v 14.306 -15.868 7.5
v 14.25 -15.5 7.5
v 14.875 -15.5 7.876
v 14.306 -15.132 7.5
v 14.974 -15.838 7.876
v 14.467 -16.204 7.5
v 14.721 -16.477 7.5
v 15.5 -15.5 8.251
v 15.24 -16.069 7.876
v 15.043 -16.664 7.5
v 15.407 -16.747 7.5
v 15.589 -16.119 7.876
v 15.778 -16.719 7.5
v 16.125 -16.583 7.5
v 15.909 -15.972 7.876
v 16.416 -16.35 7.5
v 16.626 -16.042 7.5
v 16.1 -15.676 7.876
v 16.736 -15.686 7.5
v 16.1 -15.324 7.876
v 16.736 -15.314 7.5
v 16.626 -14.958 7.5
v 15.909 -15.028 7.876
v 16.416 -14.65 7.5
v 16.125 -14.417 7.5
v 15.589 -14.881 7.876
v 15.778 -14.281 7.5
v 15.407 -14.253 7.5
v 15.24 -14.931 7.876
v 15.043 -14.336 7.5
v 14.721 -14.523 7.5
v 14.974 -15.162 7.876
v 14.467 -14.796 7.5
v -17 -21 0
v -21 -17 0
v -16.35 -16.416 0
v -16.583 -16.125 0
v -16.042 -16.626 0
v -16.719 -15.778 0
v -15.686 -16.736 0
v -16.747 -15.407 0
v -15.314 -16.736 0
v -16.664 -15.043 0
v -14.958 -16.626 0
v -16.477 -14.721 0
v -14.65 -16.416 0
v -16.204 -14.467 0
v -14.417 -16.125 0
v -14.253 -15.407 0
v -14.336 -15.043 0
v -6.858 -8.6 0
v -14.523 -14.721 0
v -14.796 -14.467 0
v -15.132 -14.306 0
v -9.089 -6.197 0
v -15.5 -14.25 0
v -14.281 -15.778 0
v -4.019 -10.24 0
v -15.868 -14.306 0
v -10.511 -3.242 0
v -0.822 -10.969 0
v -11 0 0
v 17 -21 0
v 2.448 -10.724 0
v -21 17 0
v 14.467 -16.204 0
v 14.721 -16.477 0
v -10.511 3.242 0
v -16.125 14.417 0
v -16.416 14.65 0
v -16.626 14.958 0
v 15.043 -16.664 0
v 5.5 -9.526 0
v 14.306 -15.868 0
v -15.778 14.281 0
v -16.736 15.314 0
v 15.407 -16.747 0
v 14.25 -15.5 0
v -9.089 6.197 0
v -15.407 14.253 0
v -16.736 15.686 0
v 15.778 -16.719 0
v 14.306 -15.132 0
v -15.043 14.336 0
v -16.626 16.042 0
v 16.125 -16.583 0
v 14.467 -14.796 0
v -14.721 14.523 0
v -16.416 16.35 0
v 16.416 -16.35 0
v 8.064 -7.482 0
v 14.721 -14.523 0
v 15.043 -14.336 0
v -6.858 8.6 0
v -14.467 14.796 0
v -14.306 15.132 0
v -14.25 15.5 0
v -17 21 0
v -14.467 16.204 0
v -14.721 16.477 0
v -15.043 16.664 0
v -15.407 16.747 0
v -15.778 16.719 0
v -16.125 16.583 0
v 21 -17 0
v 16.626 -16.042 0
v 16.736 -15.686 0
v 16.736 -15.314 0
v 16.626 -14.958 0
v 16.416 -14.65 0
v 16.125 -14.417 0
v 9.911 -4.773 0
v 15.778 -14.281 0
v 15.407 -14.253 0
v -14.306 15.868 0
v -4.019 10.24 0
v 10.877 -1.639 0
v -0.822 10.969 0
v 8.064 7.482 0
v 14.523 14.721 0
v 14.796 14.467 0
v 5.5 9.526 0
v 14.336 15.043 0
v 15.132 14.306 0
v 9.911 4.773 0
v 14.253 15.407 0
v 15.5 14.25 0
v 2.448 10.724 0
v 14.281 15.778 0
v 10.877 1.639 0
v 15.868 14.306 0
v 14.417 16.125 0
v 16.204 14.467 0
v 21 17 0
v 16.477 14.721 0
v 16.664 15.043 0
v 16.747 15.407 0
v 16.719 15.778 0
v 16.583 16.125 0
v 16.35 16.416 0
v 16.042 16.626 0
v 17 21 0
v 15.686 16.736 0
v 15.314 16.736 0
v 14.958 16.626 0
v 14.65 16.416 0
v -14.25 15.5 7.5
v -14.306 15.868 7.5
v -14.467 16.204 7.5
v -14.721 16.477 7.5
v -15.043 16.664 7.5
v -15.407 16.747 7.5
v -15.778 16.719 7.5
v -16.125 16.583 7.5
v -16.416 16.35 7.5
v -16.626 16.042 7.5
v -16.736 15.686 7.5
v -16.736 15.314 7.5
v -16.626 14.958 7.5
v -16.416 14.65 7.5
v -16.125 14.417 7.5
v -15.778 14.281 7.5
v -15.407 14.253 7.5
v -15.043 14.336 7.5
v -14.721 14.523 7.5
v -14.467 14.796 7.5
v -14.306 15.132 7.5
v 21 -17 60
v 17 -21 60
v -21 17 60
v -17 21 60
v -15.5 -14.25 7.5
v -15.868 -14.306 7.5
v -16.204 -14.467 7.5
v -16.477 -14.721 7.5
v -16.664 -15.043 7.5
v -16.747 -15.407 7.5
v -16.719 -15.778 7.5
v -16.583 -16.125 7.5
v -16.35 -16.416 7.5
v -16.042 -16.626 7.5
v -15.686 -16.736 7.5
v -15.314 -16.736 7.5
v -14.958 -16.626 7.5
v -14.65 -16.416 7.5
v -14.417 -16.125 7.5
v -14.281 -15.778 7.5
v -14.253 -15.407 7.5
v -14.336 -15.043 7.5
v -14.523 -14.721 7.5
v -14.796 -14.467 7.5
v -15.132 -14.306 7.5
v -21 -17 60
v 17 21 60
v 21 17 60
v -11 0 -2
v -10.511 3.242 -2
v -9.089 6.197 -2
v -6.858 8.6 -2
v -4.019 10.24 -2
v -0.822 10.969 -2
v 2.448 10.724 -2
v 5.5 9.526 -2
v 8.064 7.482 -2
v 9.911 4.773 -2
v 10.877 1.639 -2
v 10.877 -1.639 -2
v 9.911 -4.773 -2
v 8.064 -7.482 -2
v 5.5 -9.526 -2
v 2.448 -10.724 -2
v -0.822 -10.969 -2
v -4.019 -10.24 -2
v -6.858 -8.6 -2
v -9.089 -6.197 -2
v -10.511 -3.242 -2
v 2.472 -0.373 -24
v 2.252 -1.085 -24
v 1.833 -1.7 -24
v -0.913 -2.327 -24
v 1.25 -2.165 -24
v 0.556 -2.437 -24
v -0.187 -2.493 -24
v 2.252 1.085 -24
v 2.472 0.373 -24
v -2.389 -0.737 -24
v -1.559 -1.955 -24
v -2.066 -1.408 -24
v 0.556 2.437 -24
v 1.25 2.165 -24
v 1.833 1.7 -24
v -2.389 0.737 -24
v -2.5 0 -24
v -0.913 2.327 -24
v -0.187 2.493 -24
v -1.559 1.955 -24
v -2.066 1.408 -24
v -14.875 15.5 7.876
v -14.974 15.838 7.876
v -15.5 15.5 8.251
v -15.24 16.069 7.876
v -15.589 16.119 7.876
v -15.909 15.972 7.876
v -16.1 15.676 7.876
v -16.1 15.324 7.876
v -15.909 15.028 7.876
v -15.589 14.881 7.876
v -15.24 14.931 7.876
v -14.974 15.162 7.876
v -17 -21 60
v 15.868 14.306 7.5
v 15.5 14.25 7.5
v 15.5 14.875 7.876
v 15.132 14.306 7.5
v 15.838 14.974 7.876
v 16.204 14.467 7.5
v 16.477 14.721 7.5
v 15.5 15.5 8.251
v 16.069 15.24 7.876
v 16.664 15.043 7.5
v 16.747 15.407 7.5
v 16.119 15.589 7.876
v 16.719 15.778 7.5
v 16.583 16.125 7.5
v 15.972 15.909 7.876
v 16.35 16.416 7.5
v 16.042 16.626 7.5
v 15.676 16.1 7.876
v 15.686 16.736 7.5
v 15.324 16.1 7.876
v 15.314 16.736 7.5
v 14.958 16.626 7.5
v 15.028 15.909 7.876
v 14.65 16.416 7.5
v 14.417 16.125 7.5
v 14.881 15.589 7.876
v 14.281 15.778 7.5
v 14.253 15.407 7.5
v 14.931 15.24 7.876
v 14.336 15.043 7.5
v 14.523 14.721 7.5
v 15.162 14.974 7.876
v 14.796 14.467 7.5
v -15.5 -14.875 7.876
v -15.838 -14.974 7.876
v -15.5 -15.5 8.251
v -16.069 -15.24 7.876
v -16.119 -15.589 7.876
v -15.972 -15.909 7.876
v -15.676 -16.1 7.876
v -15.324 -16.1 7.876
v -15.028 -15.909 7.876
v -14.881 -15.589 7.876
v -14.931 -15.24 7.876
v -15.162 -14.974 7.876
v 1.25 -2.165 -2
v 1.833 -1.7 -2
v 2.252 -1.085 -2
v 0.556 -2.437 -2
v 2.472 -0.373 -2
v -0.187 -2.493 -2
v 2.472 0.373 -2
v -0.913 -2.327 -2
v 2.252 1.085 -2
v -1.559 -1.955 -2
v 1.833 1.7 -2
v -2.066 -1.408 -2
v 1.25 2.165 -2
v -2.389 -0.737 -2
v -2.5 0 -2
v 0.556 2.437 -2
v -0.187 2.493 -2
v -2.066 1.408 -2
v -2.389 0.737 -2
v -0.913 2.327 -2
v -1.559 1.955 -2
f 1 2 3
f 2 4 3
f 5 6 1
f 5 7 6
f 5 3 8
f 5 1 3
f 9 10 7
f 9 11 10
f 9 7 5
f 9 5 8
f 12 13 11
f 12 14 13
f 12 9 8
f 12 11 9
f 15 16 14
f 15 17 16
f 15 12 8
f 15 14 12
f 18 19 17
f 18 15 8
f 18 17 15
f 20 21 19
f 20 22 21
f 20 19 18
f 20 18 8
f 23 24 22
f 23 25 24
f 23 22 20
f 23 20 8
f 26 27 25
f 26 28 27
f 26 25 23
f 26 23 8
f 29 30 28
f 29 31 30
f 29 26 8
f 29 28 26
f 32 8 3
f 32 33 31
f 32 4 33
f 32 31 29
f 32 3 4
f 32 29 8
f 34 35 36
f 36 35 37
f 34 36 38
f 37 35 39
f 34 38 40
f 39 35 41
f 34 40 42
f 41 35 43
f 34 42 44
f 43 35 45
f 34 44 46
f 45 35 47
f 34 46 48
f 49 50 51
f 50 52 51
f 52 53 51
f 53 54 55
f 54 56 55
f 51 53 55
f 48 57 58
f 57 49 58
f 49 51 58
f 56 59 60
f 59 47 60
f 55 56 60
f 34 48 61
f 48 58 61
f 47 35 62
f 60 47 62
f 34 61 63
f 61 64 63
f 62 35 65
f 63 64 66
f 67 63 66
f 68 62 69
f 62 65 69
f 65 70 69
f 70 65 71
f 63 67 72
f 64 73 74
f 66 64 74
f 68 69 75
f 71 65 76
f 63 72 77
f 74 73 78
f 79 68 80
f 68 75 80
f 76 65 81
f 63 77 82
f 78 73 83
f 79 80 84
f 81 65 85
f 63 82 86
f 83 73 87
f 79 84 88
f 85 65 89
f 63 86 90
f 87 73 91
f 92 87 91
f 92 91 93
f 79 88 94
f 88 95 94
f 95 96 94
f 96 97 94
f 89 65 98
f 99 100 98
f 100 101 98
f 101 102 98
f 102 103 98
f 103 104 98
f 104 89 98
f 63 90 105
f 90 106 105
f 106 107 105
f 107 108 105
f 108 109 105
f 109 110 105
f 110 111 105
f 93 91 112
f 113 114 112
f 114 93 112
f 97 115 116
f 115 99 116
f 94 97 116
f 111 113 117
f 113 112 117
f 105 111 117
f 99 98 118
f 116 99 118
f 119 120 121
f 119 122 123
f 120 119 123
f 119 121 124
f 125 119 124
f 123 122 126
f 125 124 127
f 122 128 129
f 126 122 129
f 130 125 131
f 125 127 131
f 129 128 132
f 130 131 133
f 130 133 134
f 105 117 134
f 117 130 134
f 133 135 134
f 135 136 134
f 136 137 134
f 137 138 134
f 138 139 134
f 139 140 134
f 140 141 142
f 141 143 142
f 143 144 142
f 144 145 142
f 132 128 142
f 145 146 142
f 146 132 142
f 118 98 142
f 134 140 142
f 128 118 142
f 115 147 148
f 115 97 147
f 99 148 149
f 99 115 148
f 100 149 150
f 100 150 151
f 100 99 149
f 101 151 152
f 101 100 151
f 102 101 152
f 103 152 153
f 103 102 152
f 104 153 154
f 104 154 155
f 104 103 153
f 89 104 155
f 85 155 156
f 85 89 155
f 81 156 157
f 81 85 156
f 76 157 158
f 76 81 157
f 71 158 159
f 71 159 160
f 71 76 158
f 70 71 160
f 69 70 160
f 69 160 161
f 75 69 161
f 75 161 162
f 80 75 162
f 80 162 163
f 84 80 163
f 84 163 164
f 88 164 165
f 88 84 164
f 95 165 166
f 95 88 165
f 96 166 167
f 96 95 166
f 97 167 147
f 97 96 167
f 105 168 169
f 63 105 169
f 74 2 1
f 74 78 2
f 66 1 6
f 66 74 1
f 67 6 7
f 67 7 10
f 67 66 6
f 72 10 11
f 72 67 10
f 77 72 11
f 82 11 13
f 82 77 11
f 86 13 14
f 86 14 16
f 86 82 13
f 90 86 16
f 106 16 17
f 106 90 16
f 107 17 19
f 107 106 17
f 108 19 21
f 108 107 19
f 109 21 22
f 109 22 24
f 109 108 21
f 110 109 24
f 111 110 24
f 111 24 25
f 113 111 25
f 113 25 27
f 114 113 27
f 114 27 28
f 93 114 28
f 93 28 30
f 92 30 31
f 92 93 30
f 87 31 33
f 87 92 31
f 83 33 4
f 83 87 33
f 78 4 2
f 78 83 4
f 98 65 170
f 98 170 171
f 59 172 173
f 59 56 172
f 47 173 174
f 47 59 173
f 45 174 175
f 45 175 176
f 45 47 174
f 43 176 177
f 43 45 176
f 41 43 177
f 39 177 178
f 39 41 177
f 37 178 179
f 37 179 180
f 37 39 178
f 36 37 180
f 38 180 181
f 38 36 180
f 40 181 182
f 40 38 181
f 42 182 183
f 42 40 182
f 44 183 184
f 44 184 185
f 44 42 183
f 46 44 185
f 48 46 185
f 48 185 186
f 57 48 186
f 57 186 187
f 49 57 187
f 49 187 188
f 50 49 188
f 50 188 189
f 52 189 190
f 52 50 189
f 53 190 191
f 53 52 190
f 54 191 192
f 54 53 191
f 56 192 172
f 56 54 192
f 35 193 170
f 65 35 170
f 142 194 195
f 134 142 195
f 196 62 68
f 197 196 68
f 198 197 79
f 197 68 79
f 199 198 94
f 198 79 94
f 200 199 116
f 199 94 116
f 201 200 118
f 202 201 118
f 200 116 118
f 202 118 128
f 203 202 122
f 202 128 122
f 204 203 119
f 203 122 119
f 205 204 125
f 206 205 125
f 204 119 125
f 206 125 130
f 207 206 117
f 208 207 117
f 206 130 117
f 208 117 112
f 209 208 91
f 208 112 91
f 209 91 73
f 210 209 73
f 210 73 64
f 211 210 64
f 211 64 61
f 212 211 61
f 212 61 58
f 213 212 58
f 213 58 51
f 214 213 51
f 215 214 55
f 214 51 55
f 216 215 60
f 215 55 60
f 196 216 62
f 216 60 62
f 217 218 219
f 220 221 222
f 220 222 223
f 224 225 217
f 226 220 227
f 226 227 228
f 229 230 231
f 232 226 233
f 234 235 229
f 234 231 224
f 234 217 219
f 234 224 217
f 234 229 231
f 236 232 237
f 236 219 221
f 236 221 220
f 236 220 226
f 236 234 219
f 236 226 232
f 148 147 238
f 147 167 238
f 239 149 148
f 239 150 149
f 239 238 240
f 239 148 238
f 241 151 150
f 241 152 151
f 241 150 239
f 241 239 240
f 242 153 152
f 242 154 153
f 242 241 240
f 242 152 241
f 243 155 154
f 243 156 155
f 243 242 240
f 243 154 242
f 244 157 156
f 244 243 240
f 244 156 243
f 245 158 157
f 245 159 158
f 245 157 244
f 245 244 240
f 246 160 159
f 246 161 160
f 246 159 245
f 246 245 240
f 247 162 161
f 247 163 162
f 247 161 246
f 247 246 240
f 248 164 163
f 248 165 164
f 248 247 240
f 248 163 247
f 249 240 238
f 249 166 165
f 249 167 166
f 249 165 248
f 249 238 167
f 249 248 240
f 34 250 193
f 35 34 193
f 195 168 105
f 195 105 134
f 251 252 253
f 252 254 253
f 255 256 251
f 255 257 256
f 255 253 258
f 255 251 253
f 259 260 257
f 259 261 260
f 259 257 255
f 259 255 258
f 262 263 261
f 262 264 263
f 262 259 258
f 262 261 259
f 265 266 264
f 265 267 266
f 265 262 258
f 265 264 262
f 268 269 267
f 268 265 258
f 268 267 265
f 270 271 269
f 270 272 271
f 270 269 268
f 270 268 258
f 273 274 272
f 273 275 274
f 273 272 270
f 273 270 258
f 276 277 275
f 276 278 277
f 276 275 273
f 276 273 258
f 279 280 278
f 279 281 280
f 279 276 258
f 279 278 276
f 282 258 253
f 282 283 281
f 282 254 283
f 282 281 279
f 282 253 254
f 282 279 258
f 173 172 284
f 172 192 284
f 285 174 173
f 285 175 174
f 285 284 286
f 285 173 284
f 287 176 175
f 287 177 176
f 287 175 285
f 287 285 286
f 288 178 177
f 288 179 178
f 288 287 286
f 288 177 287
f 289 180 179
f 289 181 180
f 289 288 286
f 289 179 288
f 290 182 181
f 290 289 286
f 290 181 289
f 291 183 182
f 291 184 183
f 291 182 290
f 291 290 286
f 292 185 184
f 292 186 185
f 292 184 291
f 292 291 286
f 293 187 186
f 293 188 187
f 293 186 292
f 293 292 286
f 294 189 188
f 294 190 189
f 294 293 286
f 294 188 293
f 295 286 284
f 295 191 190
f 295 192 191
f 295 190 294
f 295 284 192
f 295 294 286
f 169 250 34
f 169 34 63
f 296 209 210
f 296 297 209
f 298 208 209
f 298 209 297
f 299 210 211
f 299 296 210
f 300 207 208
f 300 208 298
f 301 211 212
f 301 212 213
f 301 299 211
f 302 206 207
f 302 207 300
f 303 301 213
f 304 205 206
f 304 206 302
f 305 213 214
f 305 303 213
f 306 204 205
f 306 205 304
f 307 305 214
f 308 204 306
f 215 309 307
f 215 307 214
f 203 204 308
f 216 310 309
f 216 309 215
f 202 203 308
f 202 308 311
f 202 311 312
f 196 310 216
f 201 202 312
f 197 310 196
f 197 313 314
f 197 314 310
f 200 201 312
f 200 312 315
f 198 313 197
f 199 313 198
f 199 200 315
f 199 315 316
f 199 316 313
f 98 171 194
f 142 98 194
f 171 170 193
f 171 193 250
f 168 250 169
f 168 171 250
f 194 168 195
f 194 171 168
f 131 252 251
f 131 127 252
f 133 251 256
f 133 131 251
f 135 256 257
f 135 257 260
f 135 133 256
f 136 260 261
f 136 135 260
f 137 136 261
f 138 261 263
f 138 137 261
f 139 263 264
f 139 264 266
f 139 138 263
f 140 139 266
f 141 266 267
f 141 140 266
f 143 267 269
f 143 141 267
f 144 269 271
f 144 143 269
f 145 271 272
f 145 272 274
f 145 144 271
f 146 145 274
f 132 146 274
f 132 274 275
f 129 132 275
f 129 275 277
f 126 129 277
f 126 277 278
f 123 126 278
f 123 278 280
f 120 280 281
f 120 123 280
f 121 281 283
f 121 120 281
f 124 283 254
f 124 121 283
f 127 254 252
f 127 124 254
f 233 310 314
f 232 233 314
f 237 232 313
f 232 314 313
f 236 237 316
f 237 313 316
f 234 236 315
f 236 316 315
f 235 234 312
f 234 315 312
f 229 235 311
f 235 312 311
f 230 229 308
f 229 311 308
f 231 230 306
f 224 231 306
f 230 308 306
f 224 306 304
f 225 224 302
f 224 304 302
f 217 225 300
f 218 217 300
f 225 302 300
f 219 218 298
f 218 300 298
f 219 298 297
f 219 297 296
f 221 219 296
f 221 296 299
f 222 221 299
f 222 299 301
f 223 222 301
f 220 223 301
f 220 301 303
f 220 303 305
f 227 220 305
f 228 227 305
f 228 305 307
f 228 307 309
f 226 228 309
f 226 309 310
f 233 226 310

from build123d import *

# Parameters (mm, degrees)
SKETCH_1_W               = 42
SKETCH_1_H               = 42
EXTRUDE_1_DEPTH          = 60
SKETCH_8_R               = 2.5
EXTRUDE_2_DEPTH          = 24
CUT_EXTRUDE_1_DEPTH      = 85
PATTERN_CIRCULAR_1_COUNT = 4
SKETCH_12_R              = 11
EXTRUDE_3_DEPTH          = 2


with BuildPart() as part:
    # Эскиз1 → Бобышка-Вытянуть1 (new body)
    with BuildSketch(Plane.XY):
        Rectangle(SKETCH_1_W, SKETCH_1_H)
    extrude(amount=EXTRUDE_1_DEPTH)

    # Эскиз8 → Бобышка-Вытянуть2 (add)
    with BuildSketch(Plane(origin=(0, 0, 0), x_dir=(-1, 0, 0), z_dir=(0, 0, -1))):
        Circle(SKETCH_8_R)
    extrude(amount=EXTRUDE_2_DEPTH)

    # Эскиз9 → Отверстие обработанное метчиком M32 (revolve, cut)
    with BuildSketch(Plane(origin=(-15.5, -15.5, 0), x_dir=(0, 1, 0), z_dir=(1, 0, 0))):
        Polygon((0, 0), (0, 8.251075774), (1.25, 7.5), (1.25, 0), align=None)
    hole_wizard_m32 = revolve(axis=Axis((-15.5, -15.5, -6.35), (0, 0, 1)), mode=Mode.SUBTRACT)

    # Эскиз3 → Вырез-Вытянуть1 (cut, through all)
    with BuildSketch(Plane.XY.offset(60)):
        Polygon((-21, 17), (-17, 21), (-21, 21), align=None)
    cut_extrude_1 = extrude(amount=-CUT_EXTRUDE_1_DEPTH, mode=Mode.SUBTRACT)

    # Круговой массив1: Отверстие обработанное метчиком M32, Вырез-Вытянуть1 ×4 about axis
    pattern_circular_1_axis = Axis((0, 0, 0), (0, 0, 1))
    for i in range(1, PATTERN_CIRCULAR_1_COUNT):
        add(hole_wizard_m32.rotate(pattern_circular_1_axis, i * 360 / PATTERN_CIRCULAR_1_COUNT), mode=Mode.SUBTRACT)
        add(cut_extrude_1.rotate(pattern_circular_1_axis, i * 360 / PATTERN_CIRCULAR_1_COUNT), mode=Mode.SUBTRACT)

    # Эскиз12 → Бобышка-Вытянуть3 (add)
    with BuildSketch(Plane(origin=(0, 0, 0), x_dir=(-1, 0, 0), z_dir=(0, 0, -1))):
        Circle(SKETCH_12_R)
    extrude(amount=EXTRUDE_3_DEPTH)


solid = part.part
